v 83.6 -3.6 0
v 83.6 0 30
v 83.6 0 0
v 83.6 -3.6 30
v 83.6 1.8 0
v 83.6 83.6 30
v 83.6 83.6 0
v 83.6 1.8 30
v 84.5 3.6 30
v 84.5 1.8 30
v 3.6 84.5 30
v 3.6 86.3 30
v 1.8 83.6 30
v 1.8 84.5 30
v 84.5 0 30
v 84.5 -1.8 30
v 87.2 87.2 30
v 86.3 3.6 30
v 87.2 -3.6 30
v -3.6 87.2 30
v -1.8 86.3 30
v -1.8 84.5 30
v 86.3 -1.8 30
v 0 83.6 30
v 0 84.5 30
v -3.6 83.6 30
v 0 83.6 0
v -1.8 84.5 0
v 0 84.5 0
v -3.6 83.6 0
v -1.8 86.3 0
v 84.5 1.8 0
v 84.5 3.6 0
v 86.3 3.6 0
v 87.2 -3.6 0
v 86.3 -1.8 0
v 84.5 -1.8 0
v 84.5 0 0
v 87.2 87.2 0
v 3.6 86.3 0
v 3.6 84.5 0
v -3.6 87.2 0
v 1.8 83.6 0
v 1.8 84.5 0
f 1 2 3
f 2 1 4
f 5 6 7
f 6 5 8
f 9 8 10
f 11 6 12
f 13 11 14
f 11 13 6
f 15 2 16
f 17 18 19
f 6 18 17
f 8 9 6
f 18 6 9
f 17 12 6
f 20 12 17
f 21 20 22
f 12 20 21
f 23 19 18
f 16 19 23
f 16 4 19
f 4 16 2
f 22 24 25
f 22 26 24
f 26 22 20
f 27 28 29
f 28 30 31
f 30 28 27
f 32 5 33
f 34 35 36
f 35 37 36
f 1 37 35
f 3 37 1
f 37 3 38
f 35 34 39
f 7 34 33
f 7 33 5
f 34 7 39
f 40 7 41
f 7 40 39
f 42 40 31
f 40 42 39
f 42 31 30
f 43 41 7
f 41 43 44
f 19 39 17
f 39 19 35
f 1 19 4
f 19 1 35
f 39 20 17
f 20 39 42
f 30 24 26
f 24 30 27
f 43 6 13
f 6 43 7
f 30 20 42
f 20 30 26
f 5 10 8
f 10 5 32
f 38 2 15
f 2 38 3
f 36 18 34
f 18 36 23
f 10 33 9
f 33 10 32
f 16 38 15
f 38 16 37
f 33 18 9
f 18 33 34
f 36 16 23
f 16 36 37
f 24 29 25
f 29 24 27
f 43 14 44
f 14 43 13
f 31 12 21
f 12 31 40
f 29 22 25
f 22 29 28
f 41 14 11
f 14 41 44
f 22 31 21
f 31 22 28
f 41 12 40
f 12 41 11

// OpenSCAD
width = 1.2 * 3;
size = 80;
height = 30;
magnet_dia = 3;
magnet_width = 2;
number_of_magnets = 3;

module magnets(wall) {
    if (wall == "primary") {
        for (i = [0:number_of_magnets - 1]) {
            translate([size + width - magnet_width, width / 2, height * ((i + 1) / (number_of_magnets + 1))]) {
                rotate([0, 90, 0]) cylinder(r = magnet_dia / 2, h = magnet_width, $fn = 50);
            }
        }
        for (i = [0:number_of_magnets - 1]) {
            translate([width / 2 + magnet_width, size + width, height * ((i + 1) / (number_of_magnets + 1))]) {
                rotate([90, 0, 0]) cylinder(r = magnet_dia / 2, h = magnet_width, $fn = 50);
            }
        }
    } else {
        for (i = [0:number_of_magnets - 1]) {
            translate([size + width, width / 2, height * ((i + 1) / (number_of_magnets + 1))]) {
                rotate([0, 90, 0]) cylinder(r = magnet_dia / 2, h = magnet_width, $fn = 50);
            }
        }
        for (i = [0:number_of_magnets - 1]) {
            translate([width / 2, size + width + magnet_width, height * ((i + 1) / (number_of_magnets + 1))]) {
                rotate([90, 0, 0]) cylinder(r = magnet_dia / 2, h = magnet_width, $fn = 50);
            }
        }
    }
}

module slot(wall) {
    if (wall == "primary") {
        // todo
    } else {
        translate([size + width, 0, 0]) {
            cube(size = [width / 2, width / 2, height]);
            translate([width / 4, - width / 2, 0]) cube(size = [width / 2, width * 3 / 2, height]);
        }
        translate([width / 2, size + width, 0]) {
            rotate([0, 0, 90]) {
                cube(size = [width / 2, width / 2, height]);
                translate([width / 4, - width / 2, 0]) cube(size = [width / 2, width * 3 / 2, height]);
            }
        }
    }
}

module primary_wall() {
    difference() {
        union() {
            cube(size = [width, size + width, height]);
            translate([0, width, 0]) rotate([0, 0, 270]) cube(size = [width, size + width, height]);
        }
        slot("primary");
        // magnets("primary");
    }
}
module secondary_wall() {
    difference() {
        translate([size + width * 2, size + width * 2, 0]) rotate([0, 0, 180]) {
            cube(size = [width, size + width * 3, height]);
            translate([0, width, 0]) rotate([0, 0, 270]) cube(size = [width, size + width * 3, height]);
        }
        slot("secondary");
        // magnets("secondary");
    }
}
// primary_wall();
secondary_wall();
